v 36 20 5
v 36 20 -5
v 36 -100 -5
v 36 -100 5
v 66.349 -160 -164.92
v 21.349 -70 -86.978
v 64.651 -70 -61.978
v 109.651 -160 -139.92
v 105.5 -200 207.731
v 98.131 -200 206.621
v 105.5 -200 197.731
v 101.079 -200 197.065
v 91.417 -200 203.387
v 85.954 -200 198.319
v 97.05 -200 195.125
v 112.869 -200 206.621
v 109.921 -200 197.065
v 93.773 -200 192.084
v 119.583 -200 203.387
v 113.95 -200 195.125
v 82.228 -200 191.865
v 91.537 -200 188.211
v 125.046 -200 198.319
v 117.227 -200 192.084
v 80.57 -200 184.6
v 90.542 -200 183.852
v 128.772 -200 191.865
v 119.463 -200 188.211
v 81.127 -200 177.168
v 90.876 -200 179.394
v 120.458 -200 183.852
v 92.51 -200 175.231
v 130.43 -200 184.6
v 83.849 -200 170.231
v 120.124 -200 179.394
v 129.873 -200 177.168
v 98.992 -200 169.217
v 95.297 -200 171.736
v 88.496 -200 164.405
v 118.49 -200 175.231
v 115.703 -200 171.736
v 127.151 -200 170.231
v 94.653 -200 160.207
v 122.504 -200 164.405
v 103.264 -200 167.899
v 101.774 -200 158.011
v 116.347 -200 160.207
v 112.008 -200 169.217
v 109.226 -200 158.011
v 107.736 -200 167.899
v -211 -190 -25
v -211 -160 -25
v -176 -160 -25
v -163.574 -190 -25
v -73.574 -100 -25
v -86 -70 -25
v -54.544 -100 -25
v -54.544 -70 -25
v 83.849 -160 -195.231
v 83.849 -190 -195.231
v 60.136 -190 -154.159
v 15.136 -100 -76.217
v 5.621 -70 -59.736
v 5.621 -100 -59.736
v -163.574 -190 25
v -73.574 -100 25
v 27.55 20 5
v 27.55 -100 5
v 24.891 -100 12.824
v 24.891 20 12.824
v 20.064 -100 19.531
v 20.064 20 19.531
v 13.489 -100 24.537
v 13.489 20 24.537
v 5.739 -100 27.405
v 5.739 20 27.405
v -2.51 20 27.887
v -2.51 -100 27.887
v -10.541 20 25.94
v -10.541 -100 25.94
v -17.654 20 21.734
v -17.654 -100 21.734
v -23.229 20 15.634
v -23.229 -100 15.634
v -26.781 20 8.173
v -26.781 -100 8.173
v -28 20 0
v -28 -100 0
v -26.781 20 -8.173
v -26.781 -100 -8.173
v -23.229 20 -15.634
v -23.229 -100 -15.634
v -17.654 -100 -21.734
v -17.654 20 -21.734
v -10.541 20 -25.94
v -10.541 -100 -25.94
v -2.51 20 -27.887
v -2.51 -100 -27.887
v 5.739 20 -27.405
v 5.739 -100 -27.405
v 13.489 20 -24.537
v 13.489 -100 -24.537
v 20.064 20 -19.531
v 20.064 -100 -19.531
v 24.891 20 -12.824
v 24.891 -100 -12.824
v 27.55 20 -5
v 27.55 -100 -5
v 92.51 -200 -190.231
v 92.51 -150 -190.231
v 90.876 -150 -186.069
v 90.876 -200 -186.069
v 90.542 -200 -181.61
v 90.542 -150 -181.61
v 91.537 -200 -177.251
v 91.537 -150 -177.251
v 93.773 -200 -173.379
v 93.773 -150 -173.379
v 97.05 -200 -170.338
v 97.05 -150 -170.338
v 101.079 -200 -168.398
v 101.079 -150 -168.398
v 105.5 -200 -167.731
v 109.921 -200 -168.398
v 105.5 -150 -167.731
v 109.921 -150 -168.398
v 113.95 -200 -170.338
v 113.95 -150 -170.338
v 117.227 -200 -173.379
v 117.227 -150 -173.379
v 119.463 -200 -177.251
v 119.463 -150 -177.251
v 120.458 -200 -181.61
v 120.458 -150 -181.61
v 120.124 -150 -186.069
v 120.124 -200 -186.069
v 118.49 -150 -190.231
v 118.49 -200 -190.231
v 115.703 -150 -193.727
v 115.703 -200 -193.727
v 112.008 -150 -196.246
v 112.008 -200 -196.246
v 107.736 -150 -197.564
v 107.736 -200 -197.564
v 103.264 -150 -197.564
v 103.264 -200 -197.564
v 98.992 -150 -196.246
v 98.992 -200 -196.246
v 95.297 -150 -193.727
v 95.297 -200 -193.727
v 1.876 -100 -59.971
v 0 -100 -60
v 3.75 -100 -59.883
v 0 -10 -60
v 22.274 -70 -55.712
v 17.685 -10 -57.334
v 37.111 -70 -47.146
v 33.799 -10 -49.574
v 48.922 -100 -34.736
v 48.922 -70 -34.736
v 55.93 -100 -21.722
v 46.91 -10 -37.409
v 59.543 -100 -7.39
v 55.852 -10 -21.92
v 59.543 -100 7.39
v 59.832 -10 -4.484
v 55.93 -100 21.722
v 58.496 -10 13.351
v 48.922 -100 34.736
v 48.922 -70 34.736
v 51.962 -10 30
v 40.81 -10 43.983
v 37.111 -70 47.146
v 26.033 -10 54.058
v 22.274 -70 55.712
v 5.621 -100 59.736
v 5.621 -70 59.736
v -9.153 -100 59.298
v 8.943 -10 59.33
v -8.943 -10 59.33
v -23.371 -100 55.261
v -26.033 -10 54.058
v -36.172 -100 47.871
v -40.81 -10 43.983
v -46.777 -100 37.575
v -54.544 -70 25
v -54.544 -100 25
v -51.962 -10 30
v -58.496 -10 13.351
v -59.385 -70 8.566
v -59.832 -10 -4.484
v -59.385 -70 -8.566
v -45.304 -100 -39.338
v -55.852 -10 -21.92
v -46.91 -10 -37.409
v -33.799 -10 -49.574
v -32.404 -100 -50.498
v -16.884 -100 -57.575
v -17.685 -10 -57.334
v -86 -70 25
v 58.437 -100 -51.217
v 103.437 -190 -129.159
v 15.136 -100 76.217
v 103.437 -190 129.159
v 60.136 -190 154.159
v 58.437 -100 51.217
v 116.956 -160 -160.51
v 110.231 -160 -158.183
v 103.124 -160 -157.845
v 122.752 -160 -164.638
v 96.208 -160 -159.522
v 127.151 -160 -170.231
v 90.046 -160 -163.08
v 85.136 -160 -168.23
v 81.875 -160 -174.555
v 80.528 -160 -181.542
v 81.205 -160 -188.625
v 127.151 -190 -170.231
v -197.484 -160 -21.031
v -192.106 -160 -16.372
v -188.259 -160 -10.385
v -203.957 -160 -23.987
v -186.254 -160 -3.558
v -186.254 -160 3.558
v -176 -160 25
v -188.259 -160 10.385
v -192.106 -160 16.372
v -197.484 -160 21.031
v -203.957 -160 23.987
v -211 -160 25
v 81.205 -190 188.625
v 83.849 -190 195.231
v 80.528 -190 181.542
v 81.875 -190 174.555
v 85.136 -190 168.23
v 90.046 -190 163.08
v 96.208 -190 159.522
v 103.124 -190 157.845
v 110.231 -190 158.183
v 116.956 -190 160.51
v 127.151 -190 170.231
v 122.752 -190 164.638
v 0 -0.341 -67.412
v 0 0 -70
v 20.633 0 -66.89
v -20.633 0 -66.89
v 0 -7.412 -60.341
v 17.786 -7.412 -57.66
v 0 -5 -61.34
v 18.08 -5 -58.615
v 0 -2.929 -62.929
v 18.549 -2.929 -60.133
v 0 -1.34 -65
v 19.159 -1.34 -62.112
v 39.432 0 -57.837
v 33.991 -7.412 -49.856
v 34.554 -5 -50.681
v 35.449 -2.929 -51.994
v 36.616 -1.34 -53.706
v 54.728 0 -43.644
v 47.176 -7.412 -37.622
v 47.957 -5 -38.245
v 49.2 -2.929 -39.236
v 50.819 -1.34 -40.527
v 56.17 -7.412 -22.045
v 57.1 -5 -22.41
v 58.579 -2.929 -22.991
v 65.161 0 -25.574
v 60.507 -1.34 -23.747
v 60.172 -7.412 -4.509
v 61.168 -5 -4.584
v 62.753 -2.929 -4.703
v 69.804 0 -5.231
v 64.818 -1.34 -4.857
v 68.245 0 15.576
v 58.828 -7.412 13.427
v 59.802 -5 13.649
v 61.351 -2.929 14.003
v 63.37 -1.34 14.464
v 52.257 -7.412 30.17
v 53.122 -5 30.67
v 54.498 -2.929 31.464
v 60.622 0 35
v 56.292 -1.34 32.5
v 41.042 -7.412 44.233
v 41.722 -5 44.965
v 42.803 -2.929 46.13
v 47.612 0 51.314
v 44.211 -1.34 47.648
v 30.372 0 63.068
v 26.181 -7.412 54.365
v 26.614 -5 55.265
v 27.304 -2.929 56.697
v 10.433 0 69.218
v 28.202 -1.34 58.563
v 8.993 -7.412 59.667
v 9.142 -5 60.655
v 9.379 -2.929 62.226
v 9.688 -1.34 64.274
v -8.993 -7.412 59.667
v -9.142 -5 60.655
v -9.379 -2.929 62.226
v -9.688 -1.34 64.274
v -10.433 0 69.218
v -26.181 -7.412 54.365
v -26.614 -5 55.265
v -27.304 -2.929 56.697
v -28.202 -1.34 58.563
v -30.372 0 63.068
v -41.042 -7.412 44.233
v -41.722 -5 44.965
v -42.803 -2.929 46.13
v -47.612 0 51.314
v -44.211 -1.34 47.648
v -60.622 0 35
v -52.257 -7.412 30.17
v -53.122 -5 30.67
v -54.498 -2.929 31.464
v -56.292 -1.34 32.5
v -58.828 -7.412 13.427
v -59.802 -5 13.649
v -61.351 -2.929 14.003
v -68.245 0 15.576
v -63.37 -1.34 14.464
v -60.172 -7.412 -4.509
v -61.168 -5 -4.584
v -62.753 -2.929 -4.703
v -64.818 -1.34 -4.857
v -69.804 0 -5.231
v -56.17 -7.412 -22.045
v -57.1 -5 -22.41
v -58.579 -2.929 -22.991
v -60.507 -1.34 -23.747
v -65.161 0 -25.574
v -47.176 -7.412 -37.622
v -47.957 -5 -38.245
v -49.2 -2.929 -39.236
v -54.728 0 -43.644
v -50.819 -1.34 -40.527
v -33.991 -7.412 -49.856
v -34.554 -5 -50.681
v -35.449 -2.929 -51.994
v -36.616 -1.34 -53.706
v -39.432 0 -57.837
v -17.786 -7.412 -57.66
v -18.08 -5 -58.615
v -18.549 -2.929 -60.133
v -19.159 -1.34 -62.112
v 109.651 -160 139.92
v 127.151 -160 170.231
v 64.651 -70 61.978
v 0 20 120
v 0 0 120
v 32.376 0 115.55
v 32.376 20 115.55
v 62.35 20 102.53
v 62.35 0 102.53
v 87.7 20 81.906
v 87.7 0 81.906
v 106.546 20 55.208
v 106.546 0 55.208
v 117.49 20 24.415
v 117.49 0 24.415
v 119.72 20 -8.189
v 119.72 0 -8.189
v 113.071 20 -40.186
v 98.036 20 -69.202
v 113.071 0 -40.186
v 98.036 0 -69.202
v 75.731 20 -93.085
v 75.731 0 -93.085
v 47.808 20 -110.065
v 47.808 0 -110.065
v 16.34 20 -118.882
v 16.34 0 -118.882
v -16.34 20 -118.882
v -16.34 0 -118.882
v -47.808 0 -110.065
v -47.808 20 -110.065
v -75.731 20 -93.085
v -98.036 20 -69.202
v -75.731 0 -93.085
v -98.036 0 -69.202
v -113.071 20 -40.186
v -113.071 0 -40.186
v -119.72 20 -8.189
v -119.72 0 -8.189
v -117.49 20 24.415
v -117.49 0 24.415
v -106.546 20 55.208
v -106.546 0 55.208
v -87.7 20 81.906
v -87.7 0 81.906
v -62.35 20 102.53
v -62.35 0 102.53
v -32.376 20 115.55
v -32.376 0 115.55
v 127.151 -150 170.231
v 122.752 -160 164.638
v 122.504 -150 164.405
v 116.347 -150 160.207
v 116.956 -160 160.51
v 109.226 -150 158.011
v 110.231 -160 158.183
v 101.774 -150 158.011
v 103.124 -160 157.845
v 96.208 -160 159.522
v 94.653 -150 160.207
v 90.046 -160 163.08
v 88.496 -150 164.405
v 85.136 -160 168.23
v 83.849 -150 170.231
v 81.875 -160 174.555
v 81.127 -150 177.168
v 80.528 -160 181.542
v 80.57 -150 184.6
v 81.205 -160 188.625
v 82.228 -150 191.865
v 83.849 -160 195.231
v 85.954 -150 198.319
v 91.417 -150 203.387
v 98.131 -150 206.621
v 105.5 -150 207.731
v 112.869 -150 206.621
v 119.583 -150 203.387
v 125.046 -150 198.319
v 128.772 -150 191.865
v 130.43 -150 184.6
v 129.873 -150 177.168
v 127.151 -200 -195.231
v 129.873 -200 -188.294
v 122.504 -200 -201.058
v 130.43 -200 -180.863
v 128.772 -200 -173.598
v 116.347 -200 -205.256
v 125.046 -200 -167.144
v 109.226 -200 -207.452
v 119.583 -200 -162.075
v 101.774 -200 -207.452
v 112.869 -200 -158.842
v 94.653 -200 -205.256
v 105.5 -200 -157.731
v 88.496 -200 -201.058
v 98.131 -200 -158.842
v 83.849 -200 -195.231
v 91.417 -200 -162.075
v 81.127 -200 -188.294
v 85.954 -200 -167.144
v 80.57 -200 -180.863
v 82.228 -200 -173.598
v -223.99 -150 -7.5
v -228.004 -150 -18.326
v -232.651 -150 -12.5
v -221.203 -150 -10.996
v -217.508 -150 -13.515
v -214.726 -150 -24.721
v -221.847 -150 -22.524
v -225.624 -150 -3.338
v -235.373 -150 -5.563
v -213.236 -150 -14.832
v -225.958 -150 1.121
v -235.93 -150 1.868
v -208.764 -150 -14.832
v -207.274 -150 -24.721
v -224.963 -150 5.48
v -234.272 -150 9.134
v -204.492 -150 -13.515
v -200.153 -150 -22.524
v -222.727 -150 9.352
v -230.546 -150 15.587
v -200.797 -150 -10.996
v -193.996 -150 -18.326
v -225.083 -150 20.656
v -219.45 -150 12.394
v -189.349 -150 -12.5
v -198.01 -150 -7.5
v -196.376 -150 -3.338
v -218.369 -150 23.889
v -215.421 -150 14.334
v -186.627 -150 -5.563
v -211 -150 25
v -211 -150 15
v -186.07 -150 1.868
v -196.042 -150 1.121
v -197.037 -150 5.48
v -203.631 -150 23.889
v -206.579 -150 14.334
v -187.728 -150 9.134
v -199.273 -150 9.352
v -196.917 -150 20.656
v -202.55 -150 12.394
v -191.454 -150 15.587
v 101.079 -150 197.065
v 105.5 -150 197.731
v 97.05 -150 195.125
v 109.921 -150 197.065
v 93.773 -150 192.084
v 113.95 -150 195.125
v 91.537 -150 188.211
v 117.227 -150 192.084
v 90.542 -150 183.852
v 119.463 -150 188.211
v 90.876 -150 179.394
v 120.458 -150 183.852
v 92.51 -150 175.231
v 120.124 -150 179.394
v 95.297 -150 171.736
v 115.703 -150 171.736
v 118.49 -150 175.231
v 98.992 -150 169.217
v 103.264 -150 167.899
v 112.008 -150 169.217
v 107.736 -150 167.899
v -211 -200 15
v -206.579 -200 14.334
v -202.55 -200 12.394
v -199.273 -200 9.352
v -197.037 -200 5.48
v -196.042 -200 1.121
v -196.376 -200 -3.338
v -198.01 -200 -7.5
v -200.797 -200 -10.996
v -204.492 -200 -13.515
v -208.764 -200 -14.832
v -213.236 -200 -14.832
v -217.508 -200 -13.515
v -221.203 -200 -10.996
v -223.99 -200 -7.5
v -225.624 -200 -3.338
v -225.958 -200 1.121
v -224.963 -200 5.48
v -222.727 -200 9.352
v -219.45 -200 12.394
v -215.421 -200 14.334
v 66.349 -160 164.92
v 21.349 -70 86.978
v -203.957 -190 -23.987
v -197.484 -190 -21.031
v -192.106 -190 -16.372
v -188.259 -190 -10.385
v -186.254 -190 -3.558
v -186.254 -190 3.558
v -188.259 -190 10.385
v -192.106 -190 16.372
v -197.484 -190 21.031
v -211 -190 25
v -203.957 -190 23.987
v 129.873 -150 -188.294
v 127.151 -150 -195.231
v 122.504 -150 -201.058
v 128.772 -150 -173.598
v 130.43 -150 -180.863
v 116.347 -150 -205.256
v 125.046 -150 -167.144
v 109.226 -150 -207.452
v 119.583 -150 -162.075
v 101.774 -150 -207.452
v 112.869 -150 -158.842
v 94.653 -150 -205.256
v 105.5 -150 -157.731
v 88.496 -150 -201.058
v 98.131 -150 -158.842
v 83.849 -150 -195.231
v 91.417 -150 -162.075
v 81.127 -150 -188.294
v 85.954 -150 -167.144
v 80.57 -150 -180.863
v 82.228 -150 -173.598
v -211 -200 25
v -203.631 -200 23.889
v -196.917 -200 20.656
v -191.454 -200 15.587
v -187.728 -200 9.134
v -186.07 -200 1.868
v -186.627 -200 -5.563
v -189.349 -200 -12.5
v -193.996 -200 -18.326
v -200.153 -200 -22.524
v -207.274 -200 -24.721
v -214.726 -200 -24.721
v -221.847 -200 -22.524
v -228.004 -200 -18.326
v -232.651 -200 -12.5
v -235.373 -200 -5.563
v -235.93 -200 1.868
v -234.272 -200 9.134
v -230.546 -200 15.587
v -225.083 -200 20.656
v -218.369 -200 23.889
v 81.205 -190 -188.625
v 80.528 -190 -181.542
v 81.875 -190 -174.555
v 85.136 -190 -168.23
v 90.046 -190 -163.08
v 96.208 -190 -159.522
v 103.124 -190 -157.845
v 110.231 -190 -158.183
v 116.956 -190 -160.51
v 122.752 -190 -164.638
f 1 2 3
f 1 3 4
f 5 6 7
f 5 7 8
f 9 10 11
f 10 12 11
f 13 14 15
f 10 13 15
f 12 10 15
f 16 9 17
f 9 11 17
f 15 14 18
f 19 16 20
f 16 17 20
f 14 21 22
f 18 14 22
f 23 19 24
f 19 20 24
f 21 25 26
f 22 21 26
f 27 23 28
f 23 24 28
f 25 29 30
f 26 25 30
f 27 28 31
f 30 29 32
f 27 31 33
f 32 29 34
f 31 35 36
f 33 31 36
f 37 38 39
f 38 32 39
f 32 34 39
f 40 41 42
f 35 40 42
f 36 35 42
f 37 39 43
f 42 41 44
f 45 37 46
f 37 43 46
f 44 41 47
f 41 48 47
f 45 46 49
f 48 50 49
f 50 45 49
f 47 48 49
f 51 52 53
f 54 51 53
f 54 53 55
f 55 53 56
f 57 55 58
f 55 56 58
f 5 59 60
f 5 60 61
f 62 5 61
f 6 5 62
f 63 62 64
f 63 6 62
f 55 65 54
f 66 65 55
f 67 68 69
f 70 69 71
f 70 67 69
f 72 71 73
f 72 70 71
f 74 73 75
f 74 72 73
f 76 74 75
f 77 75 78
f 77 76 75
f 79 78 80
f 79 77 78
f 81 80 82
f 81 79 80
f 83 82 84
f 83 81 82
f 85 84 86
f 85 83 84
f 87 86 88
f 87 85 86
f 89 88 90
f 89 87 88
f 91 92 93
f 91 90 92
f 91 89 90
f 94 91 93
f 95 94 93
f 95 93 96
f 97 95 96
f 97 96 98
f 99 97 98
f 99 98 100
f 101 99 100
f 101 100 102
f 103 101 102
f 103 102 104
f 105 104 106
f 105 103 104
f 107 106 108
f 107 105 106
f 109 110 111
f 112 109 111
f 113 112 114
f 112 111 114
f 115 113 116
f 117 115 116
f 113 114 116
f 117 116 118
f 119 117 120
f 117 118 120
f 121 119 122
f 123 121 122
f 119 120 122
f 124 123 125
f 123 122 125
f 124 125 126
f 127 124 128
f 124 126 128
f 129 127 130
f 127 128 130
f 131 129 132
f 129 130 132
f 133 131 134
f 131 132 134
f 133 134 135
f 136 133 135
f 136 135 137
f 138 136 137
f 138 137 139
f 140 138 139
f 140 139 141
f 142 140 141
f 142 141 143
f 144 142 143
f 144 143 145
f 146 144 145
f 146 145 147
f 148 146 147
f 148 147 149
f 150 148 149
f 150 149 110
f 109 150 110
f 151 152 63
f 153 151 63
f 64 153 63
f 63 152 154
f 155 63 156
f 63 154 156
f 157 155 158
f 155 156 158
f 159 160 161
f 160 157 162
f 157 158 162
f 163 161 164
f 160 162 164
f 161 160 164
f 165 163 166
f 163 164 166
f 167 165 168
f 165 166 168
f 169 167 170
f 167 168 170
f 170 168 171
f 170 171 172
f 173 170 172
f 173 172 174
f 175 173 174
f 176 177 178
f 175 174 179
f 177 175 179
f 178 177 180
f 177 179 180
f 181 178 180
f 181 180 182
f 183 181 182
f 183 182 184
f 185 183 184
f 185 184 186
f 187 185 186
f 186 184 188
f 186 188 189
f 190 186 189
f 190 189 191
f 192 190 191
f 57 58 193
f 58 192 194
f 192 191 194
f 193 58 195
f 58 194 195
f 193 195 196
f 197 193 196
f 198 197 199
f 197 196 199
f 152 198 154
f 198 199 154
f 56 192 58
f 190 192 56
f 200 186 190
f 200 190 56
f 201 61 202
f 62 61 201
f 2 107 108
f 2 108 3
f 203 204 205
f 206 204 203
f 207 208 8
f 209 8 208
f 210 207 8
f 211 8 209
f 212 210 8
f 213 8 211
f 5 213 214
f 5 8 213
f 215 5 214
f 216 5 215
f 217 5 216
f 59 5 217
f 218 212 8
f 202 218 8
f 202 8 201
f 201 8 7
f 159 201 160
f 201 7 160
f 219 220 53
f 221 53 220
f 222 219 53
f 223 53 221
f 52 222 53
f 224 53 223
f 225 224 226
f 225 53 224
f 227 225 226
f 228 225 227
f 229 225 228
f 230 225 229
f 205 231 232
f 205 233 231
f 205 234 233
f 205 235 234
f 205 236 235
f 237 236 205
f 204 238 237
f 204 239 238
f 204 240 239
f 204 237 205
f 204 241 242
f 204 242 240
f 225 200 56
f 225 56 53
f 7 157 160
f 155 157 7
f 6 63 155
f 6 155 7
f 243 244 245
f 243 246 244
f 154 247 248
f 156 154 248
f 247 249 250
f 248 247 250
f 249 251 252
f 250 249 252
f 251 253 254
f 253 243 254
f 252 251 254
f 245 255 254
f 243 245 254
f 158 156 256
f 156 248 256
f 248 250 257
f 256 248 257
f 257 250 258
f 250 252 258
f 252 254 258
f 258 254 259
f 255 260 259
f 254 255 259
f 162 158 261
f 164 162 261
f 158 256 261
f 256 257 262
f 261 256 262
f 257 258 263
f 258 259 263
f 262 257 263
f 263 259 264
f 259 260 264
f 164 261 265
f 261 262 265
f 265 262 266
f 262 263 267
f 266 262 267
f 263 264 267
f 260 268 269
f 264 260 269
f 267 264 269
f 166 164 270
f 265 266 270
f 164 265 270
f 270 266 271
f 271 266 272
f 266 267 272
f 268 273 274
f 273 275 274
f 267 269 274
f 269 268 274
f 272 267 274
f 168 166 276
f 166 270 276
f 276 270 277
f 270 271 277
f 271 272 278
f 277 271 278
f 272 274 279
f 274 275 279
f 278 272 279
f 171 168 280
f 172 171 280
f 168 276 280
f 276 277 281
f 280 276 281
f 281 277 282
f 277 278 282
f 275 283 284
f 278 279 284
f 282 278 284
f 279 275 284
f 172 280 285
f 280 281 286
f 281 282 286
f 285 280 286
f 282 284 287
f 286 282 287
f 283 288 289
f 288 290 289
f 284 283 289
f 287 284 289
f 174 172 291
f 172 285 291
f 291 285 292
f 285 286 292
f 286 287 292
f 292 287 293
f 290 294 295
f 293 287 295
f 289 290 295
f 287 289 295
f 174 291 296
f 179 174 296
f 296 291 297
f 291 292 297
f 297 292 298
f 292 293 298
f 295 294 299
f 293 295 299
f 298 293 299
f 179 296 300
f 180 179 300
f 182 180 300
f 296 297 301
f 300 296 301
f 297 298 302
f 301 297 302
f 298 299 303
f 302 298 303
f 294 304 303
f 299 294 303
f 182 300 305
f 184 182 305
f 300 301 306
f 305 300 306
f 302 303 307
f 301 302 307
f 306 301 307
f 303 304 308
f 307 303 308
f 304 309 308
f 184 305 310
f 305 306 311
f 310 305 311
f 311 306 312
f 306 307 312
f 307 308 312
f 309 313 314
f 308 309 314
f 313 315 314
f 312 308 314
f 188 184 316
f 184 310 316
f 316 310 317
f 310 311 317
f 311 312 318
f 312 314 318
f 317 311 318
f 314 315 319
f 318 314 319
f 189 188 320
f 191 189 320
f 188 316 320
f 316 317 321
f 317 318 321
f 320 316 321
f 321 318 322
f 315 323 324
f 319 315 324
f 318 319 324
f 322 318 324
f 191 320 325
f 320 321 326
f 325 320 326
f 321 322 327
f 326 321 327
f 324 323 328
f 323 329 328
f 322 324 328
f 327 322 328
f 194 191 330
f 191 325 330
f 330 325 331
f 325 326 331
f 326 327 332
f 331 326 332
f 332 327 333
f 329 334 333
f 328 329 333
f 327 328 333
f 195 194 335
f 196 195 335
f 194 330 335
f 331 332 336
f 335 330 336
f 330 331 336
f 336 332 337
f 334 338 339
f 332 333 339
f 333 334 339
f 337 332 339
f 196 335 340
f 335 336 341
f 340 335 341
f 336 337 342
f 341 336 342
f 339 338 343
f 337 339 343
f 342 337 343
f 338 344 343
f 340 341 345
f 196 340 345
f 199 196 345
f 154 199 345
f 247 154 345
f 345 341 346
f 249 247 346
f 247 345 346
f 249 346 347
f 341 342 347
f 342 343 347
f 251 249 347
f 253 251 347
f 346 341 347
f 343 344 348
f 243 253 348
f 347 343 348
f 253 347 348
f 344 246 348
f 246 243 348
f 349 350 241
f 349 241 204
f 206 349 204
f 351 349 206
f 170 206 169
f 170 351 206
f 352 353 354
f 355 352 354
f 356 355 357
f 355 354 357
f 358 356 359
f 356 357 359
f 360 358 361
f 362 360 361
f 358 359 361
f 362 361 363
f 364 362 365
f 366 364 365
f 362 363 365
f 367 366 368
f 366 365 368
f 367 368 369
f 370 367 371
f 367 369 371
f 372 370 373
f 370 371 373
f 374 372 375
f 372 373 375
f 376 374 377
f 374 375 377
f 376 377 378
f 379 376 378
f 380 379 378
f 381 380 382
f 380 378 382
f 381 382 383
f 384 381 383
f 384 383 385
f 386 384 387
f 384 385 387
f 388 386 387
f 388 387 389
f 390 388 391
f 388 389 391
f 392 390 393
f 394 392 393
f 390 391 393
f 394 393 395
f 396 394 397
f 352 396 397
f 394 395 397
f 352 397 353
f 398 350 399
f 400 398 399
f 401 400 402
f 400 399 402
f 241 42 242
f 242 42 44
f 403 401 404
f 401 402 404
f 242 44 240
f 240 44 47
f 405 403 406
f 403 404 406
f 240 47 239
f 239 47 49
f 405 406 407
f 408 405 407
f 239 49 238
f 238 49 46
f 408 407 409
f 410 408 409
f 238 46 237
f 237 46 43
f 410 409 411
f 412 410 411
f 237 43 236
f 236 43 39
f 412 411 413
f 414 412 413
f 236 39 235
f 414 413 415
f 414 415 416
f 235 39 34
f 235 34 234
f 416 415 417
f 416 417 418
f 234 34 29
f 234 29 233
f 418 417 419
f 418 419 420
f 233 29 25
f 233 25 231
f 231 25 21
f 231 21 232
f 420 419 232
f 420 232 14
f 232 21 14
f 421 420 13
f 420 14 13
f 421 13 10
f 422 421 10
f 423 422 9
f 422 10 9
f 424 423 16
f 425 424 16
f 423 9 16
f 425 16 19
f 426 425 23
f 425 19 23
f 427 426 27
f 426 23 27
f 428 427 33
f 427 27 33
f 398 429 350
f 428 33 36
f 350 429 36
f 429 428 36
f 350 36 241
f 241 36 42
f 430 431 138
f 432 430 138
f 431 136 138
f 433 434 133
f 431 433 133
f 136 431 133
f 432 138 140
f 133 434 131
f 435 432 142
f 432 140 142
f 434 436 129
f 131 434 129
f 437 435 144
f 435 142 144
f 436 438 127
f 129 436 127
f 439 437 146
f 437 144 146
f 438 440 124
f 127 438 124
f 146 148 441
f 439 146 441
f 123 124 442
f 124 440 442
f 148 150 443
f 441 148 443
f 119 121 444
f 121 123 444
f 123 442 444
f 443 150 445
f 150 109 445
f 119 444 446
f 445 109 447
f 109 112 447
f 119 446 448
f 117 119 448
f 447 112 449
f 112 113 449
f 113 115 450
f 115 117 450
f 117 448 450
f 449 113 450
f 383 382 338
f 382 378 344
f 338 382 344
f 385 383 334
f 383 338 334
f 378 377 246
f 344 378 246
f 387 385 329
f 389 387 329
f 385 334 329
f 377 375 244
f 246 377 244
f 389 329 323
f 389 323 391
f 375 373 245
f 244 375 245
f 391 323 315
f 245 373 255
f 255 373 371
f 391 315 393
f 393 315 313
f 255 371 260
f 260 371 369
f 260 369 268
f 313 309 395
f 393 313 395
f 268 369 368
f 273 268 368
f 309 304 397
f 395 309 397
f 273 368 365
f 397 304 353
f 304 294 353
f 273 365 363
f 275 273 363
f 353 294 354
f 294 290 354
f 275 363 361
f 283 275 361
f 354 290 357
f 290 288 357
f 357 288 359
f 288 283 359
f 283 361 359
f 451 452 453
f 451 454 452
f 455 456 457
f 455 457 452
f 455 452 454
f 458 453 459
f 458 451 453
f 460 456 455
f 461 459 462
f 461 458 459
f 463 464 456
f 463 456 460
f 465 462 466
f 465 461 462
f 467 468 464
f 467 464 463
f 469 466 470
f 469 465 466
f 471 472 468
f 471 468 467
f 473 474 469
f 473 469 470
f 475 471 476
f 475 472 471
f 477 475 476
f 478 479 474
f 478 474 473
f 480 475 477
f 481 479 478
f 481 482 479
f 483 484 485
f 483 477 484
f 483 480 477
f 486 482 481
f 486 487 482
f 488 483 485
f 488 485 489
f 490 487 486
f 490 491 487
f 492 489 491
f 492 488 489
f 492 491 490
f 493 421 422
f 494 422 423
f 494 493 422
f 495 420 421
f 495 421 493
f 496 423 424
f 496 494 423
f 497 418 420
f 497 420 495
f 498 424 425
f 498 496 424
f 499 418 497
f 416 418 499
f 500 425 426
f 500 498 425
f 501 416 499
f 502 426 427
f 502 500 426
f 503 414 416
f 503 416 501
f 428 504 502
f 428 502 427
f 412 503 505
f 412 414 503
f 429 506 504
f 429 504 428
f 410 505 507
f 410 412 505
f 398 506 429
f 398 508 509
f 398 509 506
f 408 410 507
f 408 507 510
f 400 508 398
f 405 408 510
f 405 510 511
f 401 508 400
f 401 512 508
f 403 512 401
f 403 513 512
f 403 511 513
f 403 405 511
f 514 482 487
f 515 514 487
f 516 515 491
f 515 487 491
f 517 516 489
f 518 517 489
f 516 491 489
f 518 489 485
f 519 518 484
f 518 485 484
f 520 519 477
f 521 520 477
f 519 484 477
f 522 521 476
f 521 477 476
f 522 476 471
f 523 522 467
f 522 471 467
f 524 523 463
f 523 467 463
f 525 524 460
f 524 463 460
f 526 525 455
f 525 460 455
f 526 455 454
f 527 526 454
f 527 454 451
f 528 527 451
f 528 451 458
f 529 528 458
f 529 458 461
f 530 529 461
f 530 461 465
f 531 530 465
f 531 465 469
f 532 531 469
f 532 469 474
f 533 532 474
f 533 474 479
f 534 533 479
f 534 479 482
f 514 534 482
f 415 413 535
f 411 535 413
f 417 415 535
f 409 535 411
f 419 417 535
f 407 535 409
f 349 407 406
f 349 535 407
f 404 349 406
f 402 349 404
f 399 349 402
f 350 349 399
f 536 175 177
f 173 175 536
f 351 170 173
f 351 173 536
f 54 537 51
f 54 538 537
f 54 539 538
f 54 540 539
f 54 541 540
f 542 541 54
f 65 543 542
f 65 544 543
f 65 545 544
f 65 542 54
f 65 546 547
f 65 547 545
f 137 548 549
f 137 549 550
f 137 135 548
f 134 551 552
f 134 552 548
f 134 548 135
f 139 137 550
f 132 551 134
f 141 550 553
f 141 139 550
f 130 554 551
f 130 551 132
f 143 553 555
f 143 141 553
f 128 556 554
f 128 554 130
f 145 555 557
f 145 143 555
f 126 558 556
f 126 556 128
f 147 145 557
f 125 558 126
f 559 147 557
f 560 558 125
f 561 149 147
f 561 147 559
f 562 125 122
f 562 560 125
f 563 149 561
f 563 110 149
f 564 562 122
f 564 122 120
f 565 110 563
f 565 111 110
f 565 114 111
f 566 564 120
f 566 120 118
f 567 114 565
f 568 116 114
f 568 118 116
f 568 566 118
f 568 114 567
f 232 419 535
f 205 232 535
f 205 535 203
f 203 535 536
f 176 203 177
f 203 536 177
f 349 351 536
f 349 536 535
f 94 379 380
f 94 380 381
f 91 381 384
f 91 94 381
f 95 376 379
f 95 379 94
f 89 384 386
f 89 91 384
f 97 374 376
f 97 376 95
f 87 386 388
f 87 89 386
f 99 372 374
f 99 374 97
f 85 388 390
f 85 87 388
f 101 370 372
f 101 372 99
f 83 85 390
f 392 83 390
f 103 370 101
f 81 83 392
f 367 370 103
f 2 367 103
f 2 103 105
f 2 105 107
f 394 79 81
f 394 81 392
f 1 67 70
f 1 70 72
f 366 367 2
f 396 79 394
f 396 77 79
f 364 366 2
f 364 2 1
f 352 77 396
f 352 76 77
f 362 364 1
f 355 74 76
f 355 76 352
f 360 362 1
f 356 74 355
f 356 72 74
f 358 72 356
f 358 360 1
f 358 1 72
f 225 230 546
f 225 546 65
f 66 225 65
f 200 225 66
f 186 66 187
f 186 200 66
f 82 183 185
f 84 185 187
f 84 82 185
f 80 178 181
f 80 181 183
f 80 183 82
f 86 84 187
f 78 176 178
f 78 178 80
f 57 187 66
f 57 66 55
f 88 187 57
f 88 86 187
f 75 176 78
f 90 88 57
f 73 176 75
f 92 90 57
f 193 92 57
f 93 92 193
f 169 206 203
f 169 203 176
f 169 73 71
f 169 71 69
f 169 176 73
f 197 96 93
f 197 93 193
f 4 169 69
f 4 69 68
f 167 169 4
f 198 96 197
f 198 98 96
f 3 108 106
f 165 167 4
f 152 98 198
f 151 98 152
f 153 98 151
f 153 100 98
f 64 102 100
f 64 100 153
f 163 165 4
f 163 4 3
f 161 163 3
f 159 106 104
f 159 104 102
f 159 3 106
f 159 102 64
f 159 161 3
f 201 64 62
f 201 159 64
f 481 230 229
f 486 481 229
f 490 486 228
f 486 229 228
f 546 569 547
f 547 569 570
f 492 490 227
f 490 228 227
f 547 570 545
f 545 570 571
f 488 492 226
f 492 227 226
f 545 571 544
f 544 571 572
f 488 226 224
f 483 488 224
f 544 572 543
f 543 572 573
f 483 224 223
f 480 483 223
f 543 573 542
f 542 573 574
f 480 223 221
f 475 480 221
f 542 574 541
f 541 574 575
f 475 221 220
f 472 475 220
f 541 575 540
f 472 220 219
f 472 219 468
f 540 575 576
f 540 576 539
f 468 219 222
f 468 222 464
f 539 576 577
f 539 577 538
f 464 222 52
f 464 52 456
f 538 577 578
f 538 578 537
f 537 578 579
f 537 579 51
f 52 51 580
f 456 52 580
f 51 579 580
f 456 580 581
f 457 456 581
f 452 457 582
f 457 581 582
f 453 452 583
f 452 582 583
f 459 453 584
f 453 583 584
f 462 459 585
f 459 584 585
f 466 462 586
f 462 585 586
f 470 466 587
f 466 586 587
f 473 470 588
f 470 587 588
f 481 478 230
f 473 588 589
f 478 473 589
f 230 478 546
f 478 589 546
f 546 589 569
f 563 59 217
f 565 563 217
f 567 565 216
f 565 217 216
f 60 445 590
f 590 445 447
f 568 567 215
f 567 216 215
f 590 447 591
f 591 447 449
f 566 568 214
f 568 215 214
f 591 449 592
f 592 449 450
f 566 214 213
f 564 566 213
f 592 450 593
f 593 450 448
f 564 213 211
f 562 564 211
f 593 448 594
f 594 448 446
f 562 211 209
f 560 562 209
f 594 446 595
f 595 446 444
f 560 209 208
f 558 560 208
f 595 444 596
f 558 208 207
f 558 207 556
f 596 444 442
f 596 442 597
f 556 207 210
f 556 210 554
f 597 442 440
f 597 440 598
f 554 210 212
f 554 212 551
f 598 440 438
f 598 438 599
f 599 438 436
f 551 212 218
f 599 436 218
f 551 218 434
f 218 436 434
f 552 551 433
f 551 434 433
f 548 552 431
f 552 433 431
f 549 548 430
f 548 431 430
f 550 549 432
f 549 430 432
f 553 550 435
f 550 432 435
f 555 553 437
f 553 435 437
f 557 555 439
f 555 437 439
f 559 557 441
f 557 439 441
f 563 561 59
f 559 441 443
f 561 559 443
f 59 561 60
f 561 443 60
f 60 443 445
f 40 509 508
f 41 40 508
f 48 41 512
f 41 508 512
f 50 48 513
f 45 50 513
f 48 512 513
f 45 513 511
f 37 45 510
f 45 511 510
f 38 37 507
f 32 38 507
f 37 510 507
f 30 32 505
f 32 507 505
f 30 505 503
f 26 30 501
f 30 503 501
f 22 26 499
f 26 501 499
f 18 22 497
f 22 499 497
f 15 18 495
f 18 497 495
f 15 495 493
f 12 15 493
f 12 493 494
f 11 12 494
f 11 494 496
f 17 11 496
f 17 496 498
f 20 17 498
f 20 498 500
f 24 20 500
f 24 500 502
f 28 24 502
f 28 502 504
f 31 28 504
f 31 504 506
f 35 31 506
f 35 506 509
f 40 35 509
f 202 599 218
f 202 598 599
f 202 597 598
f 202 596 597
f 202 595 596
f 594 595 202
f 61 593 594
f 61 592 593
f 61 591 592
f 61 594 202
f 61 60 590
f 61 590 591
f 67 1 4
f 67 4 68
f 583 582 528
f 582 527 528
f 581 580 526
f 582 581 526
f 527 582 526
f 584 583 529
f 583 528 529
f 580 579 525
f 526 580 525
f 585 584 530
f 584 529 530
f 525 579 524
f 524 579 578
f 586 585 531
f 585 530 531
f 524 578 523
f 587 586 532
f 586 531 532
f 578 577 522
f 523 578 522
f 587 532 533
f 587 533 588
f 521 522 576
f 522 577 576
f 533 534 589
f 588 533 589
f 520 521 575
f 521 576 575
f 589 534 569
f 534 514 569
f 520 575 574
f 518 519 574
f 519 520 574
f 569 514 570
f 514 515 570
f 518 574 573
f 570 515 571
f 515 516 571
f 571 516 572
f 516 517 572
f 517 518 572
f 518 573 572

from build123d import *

# Parameters (mm, degrees)
SKETCH1_R           = 120
BOSS_EXTRUDE1_DEPTH = 20
SKETCH2_R           = 60
BOSS_EXTRUDE2_DEPTH = 100
CUT_EXTRUDE1_DEPTH  = 121
BOSS_EXTRUDE3_DEPTH = 25
BOSS_EXTRUDE4_START = -40
SKETCH5_R           = 25
BOSS_EXTRUDE4_DEPTH = 50
SKETCH6_R           = 15
CUT_EXTRUDE2_DEPTH  = 51
CIRPATTERN1_COUNT   = 3
FILLET2_R           = 10


with BuildPart() as part:
    # Sketch1 → Boss-Extrude1 (new body)
    with BuildSketch(Plane(origin=(0, 0, 0), x_dir=(1, 0, 0), z_dir=(0, 1, 0))):
        with Locations(Location((0, 0, 0), (0, 0, 270))):  # turned: the seam where the file's is
            Circle(SKETCH1_R)
    extrude(amount=BOSS_EXTRUDE1_DEPTH)

    # Sketch2 → Boss-Extrude2 (add)
    with BuildSketch(Plane.XZ):
        with Locations(Location((0, 0, 0), (0, 0, 270))):  # turned: the seam where the file's is
            Circle(SKETCH2_R)
    extrude(amount=BOSS_EXTRUDE2_DEPTH)

    # Sketch3 → Cut-Extrude1 (cut, through all)
    with BuildSketch(Plane(origin=(0, 20, 0), x_dir=(1, 0, 0), z_dir=(0, 1, 0))):
        with BuildLine():
            Line((27.549954628, 5), (36, 5))
            Line((36, 5), (36, -5))
            Line((36, -5), (27.549954628, -5))
            ThreePointArc((27.549954628, -5), (-28, 0), (27.549954628, 5))
        make_face()
    extrude(amount=-CUT_EXTRUDE1_DEPTH, mode=Mode.SUBTRACT)

    # Sketch4 → Boss-Extrude3 (add, symmetric)
    with BuildSketch(Plane.XY):
        Polygon((-45.582672643, -70), (-86, -70), (-176, -160), (-211, -160), (-211, -190), (-163.573593129, -190), (-73.573593129, -100), (-45.582672643, -100), align=None)
    boss_extrude3 = extrude(amount=BOSS_EXTRUDE3_DEPTH, both=True)

    # Sketch5 → Boss-Extrude4 (add)
    with BuildSketch(Plane(origin=(0, -160, 0), x_dir=(1, 0, 0), z_dir=(0, 1, 0)).offset(BOSS_EXTRUDE4_START)):
        with Locations(Location((-211, 0, 0), (0, 0, 270))):  # turned: the seam where the file's is
            Circle(SKETCH5_R)
    boss_extrude4 = extrude(amount=BOSS_EXTRUDE4_DEPTH)

    # Sketch6 → Cut-Extrude2 (cut, through all)
    with BuildSketch(Plane(origin=(0, -150, 0), x_dir=(1, 0, 0), z_dir=(0, 1, 0))):
        with Locations(Location((-211, 0, 0), (0, 0, 270))):  # turned: the seam where the file's is
            Circle(SKETCH6_R)
    cut_extrude2 = extrude(amount=-CUT_EXTRUDE2_DEPTH, mode=Mode.SUBTRACT)

    # CirPattern1: Boss-Extrude3, Boss-Extrude4, Cut-Extrude2 ×3 about axis
    cirpattern1_axis = Axis((0, 0, 0), (0, 1, 0))
    add([boss_extrude3.rotate(cirpattern1_axis, i * 360 / CIRPATTERN1_COUNT) for i in range(1, CIRPATTERN1_COUNT)])
    add([boss_extrude4.rotate(cirpattern1_axis, i * 360 / CIRPATTERN1_COUNT) for i in range(1, CIRPATTERN1_COUNT)])
    add([cut_extrude2.rotate(cirpattern1_axis, i * 360 / CIRPATTERN1_COUNT) for i in range(1, CIRPATTERN1_COUNT)], mode=Mode.SUBTRACT)

    # Fillet2
    fillet2_edges = [part.edges().sort_by_distance(p)[0] for p in [
        (0, 0, 60),
    ]]
    fillet(fillet2_edges, radius=FILLET2_R)


solid = part.part
